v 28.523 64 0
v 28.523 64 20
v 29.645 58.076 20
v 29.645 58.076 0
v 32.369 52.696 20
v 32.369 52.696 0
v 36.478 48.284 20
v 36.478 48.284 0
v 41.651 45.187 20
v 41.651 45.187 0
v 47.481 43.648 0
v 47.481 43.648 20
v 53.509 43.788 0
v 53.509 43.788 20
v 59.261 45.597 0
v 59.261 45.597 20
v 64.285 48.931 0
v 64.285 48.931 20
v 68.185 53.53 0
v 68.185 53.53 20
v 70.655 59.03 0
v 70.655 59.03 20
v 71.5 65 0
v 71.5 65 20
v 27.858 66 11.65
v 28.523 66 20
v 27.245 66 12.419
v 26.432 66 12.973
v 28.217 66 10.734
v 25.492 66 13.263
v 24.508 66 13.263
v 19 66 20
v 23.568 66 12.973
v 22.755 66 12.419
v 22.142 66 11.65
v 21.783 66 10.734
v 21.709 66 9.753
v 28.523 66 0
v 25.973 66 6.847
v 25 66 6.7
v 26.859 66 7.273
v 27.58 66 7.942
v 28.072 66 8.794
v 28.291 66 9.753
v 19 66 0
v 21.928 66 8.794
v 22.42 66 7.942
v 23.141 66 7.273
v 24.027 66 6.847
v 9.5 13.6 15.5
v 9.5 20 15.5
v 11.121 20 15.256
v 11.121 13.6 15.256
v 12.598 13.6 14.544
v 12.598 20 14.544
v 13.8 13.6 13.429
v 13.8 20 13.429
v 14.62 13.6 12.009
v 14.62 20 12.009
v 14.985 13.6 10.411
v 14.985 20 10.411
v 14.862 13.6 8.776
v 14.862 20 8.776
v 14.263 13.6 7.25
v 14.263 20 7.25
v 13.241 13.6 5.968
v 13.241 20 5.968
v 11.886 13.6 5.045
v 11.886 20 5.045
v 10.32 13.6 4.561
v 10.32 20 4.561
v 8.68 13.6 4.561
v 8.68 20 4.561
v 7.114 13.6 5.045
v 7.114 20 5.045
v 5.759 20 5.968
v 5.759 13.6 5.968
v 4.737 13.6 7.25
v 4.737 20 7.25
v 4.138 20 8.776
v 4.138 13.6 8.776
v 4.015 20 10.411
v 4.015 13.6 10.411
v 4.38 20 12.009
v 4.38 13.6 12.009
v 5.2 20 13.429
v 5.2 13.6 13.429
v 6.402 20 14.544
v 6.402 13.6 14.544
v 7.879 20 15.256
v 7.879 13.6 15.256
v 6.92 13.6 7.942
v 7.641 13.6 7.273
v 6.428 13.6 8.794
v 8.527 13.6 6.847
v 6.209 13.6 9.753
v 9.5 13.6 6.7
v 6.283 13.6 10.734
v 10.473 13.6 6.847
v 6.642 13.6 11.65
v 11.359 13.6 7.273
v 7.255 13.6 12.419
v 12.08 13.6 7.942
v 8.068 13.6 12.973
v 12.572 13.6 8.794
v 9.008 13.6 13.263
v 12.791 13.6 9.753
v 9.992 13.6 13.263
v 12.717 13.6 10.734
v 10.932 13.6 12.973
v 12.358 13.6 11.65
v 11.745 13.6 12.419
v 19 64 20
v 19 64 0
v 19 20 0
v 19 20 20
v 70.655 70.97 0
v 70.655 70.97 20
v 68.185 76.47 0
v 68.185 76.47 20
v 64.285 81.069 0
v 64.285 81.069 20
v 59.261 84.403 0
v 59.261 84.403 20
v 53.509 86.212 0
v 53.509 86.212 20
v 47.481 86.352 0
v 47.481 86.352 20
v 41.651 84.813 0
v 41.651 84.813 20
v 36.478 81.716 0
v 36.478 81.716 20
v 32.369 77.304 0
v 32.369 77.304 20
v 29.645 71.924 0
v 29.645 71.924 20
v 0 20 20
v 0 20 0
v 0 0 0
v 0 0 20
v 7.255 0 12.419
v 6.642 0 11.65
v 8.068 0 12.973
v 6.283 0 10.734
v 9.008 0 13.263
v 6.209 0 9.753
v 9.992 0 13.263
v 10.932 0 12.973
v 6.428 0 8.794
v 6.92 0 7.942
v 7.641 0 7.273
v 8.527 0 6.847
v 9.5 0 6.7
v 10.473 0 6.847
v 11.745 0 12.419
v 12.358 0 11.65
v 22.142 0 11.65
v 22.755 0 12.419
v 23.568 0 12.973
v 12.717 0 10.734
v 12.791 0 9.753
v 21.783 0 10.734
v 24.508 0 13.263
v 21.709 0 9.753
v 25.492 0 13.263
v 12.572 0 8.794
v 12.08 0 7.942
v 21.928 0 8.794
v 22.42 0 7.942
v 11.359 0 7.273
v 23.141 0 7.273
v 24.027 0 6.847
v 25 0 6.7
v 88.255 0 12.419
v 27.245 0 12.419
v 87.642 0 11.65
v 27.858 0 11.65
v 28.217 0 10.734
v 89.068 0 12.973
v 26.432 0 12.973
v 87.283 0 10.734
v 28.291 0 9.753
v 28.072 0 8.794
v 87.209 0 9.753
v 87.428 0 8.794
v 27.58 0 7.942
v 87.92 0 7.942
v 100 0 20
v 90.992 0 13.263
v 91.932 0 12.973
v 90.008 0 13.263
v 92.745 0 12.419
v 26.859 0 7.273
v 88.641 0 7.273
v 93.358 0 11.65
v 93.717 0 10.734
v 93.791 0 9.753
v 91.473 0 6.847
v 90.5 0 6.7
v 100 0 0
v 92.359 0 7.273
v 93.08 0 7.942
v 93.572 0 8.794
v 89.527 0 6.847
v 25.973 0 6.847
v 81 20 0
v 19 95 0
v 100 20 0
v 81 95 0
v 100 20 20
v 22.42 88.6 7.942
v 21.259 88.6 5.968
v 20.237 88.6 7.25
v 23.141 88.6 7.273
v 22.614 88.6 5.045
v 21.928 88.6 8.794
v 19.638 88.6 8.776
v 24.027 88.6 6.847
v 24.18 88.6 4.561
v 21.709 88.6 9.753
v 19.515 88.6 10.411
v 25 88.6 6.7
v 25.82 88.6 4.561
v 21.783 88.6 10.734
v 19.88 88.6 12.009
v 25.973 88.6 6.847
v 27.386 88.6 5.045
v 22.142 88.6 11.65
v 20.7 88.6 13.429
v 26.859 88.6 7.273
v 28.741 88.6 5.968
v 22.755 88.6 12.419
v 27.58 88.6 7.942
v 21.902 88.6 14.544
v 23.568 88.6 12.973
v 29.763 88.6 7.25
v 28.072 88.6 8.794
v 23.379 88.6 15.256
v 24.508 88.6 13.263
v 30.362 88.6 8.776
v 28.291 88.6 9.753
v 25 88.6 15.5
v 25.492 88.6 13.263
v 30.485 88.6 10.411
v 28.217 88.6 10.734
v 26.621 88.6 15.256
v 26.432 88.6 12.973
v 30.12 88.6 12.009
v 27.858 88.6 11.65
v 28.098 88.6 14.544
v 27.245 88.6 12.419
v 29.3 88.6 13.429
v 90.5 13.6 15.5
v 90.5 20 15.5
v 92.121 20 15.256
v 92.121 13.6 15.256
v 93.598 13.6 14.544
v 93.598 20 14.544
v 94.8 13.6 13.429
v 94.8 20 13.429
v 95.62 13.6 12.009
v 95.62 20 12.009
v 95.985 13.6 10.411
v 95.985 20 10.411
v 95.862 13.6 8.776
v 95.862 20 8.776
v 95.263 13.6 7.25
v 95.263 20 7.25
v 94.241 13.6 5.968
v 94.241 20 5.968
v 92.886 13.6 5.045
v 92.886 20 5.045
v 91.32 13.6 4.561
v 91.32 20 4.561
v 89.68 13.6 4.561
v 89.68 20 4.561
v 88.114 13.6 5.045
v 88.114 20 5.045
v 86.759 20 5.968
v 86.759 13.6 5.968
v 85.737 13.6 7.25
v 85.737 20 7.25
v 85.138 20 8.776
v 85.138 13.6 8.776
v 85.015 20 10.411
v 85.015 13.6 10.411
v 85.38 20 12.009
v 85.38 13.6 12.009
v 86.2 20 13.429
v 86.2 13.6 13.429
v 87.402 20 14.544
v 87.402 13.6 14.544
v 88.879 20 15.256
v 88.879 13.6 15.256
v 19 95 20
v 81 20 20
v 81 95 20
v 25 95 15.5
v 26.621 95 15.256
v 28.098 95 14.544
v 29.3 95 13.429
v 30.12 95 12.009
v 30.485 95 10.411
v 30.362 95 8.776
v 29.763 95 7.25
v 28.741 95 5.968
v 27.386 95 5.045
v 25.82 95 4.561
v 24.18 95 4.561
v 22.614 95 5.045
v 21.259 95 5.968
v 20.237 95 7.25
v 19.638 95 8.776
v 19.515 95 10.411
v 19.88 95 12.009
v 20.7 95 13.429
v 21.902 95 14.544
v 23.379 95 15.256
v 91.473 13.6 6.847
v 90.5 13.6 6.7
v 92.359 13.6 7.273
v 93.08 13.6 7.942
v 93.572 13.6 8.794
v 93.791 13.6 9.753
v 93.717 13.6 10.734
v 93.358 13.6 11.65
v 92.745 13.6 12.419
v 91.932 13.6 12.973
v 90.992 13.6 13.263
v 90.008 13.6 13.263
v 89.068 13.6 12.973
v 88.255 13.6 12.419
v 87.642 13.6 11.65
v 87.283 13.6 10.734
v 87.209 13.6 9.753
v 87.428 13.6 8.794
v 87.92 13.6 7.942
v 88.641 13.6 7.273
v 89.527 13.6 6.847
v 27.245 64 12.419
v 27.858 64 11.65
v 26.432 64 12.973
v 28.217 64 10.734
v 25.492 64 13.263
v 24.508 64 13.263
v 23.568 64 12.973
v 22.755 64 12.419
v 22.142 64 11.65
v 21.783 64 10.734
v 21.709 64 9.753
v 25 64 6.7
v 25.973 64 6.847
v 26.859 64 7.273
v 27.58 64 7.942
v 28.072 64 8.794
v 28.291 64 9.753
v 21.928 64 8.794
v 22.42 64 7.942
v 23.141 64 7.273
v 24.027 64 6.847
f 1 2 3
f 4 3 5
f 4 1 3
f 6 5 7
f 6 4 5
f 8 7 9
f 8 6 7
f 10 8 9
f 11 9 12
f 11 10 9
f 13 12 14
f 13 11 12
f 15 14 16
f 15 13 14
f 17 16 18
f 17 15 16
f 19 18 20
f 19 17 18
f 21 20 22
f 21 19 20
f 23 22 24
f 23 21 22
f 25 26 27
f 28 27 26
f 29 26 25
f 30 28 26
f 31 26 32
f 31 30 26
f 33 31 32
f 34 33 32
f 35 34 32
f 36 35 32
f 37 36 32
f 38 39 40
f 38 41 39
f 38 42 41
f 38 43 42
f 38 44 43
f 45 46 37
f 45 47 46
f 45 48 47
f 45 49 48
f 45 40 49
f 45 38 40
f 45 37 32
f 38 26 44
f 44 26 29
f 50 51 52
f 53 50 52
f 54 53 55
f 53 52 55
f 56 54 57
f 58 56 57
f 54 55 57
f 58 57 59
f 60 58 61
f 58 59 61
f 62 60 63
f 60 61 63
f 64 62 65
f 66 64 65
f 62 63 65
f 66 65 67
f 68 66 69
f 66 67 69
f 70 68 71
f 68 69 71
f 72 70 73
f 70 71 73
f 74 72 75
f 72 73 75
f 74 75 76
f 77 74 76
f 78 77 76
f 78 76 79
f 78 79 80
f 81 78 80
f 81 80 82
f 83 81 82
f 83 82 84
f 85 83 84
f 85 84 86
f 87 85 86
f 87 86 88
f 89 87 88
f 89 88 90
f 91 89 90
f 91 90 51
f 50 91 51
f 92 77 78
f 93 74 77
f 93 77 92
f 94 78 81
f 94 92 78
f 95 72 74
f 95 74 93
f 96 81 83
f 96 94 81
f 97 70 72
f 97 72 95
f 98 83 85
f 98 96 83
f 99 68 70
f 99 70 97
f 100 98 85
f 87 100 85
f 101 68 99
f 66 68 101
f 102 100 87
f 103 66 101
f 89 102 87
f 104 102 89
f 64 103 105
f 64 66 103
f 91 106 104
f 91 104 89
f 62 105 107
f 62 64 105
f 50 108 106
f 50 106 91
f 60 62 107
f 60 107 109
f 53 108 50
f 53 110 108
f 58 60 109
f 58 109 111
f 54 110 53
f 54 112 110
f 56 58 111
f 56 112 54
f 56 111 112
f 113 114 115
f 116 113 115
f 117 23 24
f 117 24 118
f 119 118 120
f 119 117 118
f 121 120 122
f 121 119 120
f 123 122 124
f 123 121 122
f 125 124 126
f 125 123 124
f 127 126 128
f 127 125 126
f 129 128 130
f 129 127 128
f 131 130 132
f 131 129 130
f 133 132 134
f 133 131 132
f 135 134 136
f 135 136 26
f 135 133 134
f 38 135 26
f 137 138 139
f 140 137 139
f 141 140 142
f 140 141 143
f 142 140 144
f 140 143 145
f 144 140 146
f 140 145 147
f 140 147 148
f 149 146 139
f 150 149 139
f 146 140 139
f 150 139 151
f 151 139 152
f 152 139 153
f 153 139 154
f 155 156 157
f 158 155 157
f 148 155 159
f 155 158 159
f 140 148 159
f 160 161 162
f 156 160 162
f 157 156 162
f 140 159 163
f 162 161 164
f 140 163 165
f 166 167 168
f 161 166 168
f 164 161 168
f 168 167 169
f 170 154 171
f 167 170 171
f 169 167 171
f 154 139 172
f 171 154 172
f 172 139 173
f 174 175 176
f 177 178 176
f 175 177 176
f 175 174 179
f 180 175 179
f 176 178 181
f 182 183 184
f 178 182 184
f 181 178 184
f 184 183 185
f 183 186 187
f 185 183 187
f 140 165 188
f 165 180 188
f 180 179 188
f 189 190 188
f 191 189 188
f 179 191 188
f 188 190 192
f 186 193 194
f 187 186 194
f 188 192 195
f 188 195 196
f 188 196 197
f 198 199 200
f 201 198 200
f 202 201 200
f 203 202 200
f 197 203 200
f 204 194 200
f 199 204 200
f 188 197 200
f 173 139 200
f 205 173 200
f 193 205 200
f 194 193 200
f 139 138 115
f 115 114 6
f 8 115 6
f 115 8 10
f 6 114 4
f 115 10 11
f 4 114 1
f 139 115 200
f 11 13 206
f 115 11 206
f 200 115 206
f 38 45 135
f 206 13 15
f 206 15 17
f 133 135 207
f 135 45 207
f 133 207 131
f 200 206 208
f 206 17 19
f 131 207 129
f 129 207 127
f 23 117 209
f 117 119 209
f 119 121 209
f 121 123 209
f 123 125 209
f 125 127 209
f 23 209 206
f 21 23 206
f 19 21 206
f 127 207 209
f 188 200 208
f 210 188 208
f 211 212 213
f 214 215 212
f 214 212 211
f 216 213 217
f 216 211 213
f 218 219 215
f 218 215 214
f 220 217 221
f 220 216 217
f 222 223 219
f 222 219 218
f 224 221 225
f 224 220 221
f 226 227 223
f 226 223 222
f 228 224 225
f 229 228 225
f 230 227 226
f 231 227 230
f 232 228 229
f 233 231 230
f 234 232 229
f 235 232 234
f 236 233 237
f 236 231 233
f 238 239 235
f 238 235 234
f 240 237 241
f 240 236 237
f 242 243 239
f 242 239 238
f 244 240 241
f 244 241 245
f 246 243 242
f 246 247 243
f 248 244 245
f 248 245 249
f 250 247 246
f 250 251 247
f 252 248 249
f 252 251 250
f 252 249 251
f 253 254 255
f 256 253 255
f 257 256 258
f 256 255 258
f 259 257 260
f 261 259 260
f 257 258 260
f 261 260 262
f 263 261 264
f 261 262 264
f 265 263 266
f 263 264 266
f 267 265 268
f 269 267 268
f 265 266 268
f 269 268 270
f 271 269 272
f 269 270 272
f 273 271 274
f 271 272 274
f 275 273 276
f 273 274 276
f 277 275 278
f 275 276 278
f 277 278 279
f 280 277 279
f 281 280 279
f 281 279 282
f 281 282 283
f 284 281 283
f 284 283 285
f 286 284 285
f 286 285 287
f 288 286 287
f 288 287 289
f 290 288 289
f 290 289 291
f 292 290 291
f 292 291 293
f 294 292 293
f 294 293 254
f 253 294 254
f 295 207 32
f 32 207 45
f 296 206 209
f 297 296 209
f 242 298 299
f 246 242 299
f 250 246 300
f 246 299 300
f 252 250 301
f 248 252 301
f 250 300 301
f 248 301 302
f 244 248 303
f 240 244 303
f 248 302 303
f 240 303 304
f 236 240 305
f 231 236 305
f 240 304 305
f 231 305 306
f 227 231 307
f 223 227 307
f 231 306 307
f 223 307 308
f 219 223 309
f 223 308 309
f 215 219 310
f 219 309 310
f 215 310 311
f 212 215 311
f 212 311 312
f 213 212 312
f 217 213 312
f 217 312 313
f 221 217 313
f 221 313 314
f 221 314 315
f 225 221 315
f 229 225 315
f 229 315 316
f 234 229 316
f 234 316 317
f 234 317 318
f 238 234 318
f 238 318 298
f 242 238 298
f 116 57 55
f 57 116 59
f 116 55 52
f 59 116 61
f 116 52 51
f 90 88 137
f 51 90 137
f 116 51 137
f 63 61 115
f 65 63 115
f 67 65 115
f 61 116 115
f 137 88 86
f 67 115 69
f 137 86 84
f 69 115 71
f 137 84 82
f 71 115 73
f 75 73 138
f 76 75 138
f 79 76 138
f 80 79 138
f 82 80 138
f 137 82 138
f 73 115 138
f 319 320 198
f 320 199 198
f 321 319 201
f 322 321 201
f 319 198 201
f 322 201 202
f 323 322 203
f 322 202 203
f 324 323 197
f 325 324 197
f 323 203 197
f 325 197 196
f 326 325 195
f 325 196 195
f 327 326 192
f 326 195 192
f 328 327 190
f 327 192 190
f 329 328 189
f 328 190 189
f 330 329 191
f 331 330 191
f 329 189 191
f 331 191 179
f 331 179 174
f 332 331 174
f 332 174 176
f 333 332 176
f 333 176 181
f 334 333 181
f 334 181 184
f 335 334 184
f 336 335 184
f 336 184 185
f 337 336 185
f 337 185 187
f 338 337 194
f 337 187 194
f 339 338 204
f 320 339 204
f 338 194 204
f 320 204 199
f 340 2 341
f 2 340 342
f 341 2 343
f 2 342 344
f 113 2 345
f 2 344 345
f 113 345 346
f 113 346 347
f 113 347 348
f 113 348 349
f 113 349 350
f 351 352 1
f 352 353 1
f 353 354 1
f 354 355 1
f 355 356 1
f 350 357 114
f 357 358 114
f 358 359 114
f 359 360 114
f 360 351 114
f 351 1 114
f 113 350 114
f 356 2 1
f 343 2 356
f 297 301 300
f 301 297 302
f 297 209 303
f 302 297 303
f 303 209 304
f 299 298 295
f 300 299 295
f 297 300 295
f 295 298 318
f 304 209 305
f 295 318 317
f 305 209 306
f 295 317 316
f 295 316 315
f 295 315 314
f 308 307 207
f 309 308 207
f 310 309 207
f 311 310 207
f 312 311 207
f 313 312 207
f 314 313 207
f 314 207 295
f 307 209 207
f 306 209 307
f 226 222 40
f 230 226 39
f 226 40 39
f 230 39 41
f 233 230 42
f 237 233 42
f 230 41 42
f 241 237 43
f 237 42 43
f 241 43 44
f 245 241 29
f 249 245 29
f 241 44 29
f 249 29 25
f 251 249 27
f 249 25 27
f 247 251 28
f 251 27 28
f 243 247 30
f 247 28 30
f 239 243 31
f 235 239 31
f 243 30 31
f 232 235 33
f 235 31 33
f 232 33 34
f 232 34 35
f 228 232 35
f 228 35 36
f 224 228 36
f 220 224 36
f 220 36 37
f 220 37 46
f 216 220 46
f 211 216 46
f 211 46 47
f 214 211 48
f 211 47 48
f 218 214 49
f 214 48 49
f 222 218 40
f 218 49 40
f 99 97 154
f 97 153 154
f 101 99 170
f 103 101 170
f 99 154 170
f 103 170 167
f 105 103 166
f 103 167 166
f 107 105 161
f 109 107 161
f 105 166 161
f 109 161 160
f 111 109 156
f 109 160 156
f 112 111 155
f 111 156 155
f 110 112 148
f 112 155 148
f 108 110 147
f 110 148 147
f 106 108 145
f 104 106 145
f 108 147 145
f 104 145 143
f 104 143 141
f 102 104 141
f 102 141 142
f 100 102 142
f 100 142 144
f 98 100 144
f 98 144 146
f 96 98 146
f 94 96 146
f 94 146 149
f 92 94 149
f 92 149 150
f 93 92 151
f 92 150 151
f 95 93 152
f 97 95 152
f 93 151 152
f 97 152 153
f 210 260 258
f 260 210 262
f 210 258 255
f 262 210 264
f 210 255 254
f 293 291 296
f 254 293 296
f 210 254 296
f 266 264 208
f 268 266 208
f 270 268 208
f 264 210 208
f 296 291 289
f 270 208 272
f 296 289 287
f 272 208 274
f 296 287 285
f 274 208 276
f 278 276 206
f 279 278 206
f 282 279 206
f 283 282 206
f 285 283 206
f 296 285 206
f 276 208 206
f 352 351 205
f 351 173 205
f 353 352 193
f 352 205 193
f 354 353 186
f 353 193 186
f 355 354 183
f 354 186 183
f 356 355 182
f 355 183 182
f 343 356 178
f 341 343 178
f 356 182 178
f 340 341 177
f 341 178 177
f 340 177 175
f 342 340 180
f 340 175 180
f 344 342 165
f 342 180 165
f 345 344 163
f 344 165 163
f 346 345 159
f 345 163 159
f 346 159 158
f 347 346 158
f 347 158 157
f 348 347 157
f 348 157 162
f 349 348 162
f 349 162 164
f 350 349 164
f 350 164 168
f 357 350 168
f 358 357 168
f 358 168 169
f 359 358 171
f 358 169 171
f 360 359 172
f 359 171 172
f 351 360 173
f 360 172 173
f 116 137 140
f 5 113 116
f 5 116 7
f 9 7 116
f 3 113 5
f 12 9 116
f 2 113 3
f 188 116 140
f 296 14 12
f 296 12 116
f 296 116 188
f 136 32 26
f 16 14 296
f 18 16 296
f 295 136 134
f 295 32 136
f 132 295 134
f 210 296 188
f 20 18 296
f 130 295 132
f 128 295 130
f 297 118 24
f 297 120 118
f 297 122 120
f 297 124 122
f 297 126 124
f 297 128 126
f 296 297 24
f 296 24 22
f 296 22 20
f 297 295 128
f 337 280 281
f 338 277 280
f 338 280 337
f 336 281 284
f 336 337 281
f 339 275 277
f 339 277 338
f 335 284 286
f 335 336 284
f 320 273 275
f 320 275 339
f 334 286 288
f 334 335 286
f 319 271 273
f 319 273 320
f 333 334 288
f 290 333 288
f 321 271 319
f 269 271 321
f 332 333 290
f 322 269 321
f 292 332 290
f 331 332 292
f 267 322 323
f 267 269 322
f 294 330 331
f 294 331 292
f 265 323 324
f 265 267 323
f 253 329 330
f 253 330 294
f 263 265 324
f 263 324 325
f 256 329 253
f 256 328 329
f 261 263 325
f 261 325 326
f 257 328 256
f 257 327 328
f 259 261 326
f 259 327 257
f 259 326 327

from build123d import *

# Parameters (mm, degrees)
SCHIZZO1_R                                           = 21.5
ESTRUSIONE_ESTRUSIONE1_DEPTH                         = 20
FORO_LAMATO_PER_VITE_M6_A_TESTA_CILINDRI_D           = 6.6
FORO_LAMATO_PER_VITE_M6_A_TESTA_CILINDRI_CBORE_D     = 11
FORO_LAMATO_PER_VITE_M6_A_TESTA_CILINDRI_CBORE_DEPTH = 6.4
FORO_LAMATO_PER_VITE_M6_A_TESTA_CILI_2_D             = 6.6
FORO_LAMATO_PER_VITE_M6_A_TESTA_CILI_2_CBORE_D       = 11
FORO_LAMATO_PER_VITE_M6_A_TESTA_CILI_2_CBORE_DEPTH   = 6.4
SCHIZZO7_W                                           = 15.52137419
SCHIZZO7_H                                           = 2
TAGLIO_ESTRUSIONE1_DEPTH                             = 140.373598648


with BuildPart() as part:
    # Schizzo1 → Estrusione-Estrusione1 (new body)
    with BuildSketch(Plane.XY):
        Polygon((0, 0), (100, 0), (100, 20), (81, 20), (81, 95), (19, 95), (19, 20), (0, 20), align=None)
        with Locations((50, 65)):
            Circle(SCHIZZO1_R, mode=Mode.SUBTRACT)
    extrude(amount=ESTRUSIONE_ESTRUSIONE1_DEPTH)

    # Foro lamato per Vite M6 a testa cilindri (through all)
    with Locations(Plane(origin=(9.5, 20, 10), x_dir=(0, 0, 1), z_dir=(0, 1, 0))):
        with Locations((0, 0), (0, 81)):
            CounterBoreHole(FORO_LAMATO_PER_VITE_M6_A_TESTA_CILINDRI_D / 2, FORO_LAMATO_PER_VITE_M6_A_TESTA_CILINDRI_CBORE_D / 2, FORO_LAMATO_PER_VITE_M6_A_TESTA_CILINDRI_CBORE_DEPTH)

    # Foro lamato per Vite M6 a testa cili 2 (through all)
    with Locations(Plane(origin=(25, 95, 10), x_dir=(0, 0, 1), z_dir=(0, 1, 0))):
        with Locations((0, 0)):
            CounterBoreHole(FORO_LAMATO_PER_VITE_M6_A_TESTA_CILI_2_D / 2, FORO_LAMATO_PER_VITE_M6_A_TESTA_CILI_2_CBORE_D / 2, FORO_LAMATO_PER_VITE_M6_A_TESTA_CILI_2_CBORE_DEPTH)

    # Schizzo7 → Taglio-Estrusione1 (cut, through all)
    with BuildSketch(Plane(origin=(0, 0, 0), x_dir=(-1, 0, 0), z_dir=(0, 0, -1))):
        with Locations((-23.66540179, 65)):
            Rectangle(SCHIZZO7_W, SCHIZZO7_H)
    extrude(amount=-TAGLIO_ESTRUSIONE1_DEPTH, mode=Mode.SUBTRACT)


solid = part.part
